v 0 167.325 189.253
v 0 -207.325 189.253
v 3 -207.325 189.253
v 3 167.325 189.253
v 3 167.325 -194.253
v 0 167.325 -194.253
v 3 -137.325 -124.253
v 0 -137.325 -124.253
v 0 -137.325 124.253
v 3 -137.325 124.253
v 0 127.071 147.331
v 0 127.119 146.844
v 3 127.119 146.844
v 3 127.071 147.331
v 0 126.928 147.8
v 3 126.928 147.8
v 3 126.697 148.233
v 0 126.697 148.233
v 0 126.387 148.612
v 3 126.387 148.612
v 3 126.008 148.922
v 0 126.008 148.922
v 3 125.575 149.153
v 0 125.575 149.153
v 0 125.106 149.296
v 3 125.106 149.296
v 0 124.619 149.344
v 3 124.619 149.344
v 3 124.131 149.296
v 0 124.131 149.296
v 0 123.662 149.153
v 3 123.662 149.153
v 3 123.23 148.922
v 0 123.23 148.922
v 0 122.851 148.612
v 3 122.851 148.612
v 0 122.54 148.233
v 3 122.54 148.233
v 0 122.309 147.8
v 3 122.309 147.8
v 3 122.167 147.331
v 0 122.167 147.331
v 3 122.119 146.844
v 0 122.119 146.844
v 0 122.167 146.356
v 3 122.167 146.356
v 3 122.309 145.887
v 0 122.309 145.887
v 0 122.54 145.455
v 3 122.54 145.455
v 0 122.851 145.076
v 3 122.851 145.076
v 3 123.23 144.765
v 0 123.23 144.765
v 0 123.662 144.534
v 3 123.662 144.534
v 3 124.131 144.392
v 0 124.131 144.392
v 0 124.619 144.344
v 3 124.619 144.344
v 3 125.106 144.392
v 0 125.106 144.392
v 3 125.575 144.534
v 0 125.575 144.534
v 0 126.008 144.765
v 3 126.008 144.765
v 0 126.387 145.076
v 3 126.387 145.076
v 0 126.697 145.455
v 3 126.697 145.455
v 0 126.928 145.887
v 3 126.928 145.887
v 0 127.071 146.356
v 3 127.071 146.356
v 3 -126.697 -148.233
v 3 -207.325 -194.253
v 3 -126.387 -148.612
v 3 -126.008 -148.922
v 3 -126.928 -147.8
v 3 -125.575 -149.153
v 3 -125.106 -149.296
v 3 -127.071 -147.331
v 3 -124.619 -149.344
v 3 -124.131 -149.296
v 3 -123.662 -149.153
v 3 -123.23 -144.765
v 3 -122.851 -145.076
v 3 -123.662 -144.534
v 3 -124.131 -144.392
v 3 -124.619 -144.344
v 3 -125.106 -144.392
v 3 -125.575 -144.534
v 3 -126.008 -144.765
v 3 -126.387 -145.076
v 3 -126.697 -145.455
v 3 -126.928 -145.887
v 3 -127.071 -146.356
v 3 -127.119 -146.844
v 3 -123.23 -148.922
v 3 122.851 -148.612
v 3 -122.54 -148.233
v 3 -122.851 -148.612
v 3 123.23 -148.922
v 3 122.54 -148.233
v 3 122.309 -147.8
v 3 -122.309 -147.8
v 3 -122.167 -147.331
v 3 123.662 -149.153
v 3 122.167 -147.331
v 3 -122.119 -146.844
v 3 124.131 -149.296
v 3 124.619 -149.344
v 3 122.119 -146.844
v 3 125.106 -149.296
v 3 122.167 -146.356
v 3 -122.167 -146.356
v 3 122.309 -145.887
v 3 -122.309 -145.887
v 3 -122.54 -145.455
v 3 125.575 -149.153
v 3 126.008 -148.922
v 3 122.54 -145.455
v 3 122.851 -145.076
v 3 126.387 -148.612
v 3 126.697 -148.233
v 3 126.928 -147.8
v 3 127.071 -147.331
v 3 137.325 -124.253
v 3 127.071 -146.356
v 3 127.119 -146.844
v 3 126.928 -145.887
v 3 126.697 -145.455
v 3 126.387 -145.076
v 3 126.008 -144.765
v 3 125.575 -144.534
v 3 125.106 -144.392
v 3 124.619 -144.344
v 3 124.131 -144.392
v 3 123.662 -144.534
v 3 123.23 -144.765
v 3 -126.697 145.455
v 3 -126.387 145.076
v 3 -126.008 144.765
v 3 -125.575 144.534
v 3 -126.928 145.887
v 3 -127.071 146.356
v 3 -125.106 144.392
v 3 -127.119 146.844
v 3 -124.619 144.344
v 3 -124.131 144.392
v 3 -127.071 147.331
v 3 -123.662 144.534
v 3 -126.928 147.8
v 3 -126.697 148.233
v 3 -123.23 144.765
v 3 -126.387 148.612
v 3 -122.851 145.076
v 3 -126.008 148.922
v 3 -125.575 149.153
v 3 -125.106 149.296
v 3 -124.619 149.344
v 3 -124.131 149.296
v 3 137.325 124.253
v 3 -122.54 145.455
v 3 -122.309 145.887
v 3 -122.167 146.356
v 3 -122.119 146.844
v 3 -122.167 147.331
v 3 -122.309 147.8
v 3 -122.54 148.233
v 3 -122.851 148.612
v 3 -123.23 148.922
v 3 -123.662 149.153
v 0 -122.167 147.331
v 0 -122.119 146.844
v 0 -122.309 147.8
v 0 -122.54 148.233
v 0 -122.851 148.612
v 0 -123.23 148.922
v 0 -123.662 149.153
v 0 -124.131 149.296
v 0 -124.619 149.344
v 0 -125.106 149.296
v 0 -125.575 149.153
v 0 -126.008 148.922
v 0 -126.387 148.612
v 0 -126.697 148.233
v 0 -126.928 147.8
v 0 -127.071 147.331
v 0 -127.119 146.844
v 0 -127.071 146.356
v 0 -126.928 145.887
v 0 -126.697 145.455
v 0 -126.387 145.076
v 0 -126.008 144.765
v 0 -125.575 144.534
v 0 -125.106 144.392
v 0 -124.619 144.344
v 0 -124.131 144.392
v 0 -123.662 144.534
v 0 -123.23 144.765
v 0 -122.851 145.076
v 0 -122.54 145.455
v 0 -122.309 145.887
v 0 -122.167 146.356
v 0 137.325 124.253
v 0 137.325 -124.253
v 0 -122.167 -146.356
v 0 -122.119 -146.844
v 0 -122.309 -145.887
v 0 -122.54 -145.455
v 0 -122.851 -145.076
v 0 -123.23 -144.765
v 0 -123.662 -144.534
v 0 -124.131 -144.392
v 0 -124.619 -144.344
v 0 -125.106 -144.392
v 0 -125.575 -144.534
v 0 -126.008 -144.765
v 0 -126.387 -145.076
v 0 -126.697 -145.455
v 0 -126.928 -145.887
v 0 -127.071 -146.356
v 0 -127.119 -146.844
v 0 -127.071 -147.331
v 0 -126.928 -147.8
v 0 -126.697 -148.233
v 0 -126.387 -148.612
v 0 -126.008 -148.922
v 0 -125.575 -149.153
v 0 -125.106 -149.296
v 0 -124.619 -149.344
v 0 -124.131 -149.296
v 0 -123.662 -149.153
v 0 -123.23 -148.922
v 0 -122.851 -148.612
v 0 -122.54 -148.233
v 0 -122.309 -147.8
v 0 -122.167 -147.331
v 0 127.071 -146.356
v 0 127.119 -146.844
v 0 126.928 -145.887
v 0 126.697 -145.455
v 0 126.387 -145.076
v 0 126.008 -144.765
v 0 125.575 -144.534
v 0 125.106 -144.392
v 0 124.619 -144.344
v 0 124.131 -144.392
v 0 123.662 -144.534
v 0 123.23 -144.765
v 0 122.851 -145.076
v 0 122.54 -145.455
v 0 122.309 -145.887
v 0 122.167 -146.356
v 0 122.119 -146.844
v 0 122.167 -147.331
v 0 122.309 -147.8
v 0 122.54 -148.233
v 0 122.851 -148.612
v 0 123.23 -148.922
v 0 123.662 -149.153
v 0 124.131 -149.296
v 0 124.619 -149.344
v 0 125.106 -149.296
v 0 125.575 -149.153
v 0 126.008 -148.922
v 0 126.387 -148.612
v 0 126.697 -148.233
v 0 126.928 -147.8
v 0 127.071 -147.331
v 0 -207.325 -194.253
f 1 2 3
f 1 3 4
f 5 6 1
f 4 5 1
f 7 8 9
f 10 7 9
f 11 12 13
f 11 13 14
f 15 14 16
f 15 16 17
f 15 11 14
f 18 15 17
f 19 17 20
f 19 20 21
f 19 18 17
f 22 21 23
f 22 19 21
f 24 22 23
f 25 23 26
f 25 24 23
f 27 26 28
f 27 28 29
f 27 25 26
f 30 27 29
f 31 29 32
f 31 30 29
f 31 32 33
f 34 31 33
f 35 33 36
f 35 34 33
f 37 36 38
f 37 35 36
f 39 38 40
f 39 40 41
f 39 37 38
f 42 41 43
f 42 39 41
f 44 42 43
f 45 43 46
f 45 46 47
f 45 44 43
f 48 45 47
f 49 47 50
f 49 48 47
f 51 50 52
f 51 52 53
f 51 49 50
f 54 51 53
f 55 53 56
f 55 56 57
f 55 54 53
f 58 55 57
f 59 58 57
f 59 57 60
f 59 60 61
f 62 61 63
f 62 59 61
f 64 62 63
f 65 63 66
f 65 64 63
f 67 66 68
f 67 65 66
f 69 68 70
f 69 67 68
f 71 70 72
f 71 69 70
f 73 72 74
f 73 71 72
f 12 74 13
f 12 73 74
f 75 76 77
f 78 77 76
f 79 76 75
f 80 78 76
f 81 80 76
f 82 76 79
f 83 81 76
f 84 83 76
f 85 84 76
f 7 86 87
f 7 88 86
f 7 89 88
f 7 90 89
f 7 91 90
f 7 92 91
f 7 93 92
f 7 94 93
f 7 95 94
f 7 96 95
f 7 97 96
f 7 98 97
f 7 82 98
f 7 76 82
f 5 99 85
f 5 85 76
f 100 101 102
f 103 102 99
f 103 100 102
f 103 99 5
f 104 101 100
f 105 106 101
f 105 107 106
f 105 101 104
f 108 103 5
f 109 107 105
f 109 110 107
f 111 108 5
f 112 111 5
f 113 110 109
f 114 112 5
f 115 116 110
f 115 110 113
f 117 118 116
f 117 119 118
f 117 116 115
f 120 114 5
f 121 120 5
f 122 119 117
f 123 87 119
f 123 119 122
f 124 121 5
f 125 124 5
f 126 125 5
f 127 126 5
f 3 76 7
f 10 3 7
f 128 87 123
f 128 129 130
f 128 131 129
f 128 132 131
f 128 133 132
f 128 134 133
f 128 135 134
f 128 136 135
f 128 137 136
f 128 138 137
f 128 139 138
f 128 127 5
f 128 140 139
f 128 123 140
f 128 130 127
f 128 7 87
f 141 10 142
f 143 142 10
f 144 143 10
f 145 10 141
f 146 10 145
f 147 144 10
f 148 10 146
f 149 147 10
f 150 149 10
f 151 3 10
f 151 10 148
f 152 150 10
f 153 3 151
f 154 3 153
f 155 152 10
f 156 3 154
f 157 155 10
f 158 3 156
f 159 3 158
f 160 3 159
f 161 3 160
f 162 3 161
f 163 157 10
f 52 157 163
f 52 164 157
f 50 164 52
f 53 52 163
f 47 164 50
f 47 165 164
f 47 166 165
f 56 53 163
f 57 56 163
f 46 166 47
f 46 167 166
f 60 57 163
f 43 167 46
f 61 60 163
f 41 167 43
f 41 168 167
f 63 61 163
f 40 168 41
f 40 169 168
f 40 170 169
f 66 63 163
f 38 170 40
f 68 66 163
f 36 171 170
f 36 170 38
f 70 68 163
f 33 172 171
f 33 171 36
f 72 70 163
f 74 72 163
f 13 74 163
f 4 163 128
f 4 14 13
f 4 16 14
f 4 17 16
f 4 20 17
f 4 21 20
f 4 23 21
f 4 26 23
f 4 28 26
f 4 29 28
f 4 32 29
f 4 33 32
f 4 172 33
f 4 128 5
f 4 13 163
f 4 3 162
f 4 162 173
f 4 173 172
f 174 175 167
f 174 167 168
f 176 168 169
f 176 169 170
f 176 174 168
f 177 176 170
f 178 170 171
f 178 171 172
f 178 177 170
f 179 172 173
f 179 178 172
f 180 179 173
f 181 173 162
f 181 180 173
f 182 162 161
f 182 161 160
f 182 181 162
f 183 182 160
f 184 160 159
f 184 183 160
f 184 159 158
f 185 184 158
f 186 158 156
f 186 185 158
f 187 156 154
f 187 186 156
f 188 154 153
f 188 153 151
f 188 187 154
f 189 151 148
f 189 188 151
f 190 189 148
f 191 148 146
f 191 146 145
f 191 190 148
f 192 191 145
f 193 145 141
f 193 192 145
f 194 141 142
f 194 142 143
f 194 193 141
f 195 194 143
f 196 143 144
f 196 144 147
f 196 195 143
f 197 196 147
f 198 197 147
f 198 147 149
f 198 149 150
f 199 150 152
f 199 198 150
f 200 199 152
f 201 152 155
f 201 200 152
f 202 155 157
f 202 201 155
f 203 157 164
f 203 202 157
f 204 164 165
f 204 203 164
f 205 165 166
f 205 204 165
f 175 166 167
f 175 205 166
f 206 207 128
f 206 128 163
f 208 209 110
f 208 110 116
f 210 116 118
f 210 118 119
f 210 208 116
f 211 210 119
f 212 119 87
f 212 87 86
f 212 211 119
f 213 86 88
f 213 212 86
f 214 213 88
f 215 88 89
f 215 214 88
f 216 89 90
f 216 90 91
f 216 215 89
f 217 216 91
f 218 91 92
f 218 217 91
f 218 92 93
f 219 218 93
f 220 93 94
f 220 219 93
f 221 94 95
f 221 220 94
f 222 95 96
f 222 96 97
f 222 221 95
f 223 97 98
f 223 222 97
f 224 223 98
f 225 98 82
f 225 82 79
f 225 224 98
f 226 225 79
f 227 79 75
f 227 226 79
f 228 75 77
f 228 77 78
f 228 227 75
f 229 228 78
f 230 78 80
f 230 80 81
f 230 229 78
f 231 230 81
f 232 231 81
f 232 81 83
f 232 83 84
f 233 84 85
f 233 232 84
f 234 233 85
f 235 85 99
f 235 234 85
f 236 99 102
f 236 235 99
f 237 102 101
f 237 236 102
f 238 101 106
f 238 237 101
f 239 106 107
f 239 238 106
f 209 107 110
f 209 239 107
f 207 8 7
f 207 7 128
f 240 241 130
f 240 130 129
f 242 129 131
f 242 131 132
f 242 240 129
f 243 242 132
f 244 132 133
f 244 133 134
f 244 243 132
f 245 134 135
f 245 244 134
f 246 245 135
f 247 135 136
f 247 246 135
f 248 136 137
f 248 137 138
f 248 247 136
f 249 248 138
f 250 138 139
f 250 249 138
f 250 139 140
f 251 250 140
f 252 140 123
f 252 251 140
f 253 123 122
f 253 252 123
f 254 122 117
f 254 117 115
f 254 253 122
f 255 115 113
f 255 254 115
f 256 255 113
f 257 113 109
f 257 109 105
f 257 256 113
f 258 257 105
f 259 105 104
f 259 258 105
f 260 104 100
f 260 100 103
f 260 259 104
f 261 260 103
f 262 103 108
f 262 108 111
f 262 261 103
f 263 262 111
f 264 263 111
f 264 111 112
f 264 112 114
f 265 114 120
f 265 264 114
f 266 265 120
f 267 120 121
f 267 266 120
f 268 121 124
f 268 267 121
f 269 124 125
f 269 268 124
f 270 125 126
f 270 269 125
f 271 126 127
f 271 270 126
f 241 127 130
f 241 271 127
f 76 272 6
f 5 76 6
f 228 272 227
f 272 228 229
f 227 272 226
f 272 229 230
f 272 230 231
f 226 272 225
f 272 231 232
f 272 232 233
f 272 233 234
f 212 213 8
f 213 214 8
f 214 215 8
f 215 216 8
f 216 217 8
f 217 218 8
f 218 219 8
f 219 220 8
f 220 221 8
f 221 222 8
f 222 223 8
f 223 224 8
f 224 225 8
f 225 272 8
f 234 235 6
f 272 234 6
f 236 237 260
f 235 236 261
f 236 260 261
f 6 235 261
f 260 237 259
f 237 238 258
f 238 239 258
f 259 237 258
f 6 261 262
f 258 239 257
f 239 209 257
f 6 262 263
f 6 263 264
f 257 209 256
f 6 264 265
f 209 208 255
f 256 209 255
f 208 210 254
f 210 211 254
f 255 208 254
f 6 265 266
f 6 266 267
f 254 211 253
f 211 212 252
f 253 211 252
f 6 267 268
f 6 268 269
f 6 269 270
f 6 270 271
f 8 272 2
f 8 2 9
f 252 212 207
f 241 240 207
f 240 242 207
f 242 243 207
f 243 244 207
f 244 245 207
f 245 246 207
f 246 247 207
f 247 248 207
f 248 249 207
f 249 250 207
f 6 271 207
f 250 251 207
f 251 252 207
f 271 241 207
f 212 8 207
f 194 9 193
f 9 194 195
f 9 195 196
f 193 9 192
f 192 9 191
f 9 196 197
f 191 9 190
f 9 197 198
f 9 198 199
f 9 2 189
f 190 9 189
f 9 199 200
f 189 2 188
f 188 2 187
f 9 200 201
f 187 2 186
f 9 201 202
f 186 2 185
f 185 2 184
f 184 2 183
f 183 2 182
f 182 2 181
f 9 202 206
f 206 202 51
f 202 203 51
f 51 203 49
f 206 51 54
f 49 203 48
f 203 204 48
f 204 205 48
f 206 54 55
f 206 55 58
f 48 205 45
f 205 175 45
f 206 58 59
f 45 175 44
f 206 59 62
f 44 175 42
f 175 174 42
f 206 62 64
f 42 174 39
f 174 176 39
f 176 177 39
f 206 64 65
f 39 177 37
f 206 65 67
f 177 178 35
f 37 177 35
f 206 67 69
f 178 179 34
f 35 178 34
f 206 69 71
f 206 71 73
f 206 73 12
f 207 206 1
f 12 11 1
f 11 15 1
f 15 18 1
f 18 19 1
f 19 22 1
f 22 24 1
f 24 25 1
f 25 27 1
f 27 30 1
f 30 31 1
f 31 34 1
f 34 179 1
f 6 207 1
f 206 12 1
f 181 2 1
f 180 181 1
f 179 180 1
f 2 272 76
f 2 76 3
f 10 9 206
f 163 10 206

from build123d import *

# Parameters (mm, degrees)
F0_W     = 374.65
F0_H     = 383.506636
F0_R     = 2.5
F0_W_2   = 274.65
F0_H_2   = 248.506636
F1_DEPTH = 3


with BuildPart() as f1:
    # F0 (on Right) → F1 (new body)
    with BuildSketch(Plane.YZ):
        with Locations((-20, -2.5)):
            Rectangle(F0_W, F0_H)
        with Locations((-124.61875, -146.84375)):
            Circle(F0_R, mode=Mode.SUBTRACT)
        with Locations((124.61875, -146.84375)):
            Circle(F0_R, mode=Mode.SUBTRACT)
        with Locations((-124.61875, 146.84375)):
            Circle(F0_R, mode=Mode.SUBTRACT)
        Rectangle(F0_W_2, F0_H_2, mode=Mode.SUBTRACT)
        with Locations((124.61875, 146.84375)):
            Circle(F0_R, mode=Mode.SUBTRACT)
    extrude(amount=F1_DEPTH)


solid = f1.part
